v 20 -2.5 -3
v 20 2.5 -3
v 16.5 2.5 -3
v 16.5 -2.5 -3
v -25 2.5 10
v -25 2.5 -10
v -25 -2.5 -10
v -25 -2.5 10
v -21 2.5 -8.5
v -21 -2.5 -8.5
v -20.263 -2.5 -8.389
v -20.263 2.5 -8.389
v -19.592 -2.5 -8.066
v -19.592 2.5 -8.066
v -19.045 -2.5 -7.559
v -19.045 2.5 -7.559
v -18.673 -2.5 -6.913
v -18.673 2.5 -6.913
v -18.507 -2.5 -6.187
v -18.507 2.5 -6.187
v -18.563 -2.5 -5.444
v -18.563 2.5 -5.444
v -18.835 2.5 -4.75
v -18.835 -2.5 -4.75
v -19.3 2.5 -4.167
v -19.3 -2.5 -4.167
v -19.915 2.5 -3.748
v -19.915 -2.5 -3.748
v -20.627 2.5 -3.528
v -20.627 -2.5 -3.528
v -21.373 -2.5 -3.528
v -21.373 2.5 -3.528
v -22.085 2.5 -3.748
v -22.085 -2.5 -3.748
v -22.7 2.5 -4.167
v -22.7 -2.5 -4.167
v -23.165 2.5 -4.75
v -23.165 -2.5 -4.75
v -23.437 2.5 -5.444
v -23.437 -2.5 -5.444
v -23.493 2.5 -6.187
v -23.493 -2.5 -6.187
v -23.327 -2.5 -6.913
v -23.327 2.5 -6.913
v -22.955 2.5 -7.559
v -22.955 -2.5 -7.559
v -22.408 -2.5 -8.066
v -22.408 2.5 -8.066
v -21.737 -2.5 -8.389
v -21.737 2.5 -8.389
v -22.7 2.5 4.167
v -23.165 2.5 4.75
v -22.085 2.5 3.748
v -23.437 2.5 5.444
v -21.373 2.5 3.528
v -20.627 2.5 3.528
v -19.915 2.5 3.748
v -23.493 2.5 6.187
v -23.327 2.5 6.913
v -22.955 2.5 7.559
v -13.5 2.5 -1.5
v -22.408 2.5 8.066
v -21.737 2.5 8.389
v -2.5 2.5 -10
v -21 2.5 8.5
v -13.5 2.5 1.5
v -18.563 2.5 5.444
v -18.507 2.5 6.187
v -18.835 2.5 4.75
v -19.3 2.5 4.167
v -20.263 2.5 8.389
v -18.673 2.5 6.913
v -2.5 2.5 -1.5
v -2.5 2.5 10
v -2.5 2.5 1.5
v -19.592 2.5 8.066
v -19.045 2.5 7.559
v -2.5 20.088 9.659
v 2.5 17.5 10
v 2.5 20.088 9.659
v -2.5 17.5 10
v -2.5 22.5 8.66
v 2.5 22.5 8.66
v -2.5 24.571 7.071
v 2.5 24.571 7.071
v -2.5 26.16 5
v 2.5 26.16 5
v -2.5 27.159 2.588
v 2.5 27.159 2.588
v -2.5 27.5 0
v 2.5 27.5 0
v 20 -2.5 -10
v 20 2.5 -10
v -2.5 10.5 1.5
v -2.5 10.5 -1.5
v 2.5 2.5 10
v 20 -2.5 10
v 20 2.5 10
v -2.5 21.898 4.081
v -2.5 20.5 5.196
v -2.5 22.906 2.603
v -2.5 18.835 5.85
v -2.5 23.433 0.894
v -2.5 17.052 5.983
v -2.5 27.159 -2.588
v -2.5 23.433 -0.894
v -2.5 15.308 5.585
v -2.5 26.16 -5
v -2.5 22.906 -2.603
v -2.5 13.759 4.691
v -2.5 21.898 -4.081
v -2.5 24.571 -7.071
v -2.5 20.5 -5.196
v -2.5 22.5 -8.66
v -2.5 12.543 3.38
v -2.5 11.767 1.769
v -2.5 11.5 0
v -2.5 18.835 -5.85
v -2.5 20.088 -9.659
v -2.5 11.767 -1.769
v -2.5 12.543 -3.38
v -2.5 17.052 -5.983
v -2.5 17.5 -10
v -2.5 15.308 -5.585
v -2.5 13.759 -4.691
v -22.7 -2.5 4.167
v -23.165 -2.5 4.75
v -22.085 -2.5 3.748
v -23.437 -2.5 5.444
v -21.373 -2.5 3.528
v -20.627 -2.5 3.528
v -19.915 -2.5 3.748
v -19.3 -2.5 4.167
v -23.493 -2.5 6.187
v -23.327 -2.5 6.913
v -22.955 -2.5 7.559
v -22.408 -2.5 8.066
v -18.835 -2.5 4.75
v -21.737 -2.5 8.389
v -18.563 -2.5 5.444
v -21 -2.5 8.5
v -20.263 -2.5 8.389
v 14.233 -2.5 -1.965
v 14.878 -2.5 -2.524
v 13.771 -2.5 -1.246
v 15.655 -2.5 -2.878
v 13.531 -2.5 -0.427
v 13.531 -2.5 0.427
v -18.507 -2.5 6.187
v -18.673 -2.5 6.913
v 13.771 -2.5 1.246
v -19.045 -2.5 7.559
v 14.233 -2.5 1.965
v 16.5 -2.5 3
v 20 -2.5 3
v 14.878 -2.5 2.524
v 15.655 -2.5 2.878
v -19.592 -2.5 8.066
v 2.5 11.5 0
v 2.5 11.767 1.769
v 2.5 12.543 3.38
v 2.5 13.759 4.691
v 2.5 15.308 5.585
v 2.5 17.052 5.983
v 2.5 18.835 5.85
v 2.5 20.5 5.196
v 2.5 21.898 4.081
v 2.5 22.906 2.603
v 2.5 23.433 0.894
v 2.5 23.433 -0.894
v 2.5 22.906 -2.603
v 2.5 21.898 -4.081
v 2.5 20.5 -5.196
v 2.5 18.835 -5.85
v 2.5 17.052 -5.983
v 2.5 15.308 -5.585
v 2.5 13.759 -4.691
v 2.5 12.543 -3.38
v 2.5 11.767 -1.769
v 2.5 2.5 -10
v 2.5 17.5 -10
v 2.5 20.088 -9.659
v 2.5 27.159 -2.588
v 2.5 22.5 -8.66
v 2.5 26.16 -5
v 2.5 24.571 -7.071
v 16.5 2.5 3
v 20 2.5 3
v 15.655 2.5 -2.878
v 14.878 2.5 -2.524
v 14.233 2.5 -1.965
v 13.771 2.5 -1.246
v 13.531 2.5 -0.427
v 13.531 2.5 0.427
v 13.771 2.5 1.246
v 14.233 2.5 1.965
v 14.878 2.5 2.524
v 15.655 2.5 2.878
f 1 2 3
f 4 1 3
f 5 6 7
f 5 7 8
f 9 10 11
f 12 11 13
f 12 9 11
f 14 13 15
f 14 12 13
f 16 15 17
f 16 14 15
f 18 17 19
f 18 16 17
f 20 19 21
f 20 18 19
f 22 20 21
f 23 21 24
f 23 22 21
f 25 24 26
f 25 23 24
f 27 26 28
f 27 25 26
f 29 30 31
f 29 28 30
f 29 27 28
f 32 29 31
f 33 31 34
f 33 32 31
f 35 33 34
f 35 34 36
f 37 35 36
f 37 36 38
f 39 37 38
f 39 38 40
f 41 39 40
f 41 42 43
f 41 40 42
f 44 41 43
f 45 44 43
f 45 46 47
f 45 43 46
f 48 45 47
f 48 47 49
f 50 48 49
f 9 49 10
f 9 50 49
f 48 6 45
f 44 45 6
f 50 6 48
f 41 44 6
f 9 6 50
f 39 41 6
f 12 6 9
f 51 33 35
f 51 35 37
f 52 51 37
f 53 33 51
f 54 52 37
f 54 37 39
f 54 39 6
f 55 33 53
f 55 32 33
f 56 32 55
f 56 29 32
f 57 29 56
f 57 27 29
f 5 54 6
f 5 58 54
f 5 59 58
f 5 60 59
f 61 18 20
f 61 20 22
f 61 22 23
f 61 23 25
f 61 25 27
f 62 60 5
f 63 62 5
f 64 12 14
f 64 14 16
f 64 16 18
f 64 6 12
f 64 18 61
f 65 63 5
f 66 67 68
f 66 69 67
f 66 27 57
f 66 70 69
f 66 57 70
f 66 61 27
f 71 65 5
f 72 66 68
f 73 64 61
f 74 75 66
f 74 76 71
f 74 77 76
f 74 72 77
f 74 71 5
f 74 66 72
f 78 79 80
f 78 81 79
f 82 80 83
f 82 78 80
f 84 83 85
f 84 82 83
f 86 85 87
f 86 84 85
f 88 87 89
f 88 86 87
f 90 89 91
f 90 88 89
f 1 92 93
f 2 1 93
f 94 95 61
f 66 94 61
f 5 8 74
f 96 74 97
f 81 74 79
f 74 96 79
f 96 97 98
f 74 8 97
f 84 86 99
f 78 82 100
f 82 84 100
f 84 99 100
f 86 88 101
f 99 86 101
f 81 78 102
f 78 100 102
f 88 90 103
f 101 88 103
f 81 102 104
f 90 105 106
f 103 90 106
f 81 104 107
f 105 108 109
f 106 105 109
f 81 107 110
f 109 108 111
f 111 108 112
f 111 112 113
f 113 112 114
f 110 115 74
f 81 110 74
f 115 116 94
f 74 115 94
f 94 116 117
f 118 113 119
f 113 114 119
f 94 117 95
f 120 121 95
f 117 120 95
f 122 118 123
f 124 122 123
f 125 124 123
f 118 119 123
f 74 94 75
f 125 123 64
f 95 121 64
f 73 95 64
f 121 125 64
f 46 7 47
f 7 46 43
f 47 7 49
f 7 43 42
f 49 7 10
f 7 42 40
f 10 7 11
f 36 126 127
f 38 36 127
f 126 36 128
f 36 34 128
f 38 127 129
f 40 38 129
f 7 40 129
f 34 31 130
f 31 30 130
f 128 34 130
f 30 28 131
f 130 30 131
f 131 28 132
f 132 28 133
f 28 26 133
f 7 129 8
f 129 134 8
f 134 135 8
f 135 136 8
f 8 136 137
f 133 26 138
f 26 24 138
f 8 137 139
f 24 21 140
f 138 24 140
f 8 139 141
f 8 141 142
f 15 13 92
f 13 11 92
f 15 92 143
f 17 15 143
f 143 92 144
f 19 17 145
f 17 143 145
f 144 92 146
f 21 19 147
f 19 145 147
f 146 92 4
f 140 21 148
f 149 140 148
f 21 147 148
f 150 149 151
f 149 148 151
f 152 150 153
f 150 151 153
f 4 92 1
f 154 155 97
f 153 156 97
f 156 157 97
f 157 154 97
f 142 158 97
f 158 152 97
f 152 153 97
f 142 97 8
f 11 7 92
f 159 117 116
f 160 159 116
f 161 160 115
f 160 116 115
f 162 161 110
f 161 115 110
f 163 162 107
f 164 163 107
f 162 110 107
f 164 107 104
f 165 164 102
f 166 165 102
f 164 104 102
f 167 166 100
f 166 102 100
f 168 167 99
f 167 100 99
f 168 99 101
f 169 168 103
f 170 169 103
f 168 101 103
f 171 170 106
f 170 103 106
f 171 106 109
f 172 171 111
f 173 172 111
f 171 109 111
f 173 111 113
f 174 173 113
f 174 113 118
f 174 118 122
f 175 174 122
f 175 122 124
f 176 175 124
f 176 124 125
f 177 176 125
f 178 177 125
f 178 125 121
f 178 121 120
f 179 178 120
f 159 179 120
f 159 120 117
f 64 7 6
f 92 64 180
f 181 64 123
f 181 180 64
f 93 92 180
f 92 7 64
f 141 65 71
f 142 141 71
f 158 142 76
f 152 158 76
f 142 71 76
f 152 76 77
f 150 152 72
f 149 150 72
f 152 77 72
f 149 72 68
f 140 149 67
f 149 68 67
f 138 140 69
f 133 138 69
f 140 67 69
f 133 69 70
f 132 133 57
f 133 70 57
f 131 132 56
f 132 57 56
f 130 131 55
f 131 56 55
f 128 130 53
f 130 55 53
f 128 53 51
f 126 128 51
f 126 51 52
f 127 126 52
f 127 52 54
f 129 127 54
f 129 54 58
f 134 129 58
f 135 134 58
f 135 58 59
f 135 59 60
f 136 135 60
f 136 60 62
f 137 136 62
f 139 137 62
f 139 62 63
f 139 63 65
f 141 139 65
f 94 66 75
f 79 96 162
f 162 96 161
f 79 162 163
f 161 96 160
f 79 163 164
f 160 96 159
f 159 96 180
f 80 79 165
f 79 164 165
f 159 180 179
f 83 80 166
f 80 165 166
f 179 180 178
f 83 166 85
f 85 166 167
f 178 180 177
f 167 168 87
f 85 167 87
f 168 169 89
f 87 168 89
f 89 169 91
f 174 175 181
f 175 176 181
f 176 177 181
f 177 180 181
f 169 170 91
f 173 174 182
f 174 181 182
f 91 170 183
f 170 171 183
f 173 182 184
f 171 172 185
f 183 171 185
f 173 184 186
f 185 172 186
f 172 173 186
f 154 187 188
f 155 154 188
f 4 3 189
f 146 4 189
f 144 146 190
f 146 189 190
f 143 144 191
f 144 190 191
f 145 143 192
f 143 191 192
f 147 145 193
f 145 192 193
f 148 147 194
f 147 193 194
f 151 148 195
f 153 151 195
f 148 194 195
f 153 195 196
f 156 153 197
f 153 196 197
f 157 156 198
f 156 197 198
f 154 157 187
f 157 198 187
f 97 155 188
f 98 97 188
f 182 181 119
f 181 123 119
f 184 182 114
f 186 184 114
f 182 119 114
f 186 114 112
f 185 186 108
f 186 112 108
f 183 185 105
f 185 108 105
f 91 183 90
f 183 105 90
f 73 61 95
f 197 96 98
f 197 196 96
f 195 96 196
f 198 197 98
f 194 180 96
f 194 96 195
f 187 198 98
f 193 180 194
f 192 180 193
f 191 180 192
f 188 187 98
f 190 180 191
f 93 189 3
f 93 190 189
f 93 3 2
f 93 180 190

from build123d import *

# Parameters (mm, degrees)
EXTRUDE_1_DEPTH      = 10
EXTRUDE_1_DEPTH_BACK = 10
SKETCH_1_W           = 40
SKETCH_1_H           = 5
EXTRUDE_2_DEPTH      = 1.5
EXTRUDE_2_DEPTH_BACK = 1.5
FILLET_1_R           = 10
SKETCH_2_R           = 6
CUT_EXTRUDE_1_DEPTH  = 37.912057651
SKETCH_4_R           = 3
CUT_EXTRUDE_3_DEPTH  = 34.541019662
SKETCH_5_W           = 20
SKETCH_5_H           = 5
EXTRUDE_3_DEPTH      = 5
SKETCH_3_R           = 2.5
CUT_EXTRUDE_4_DEPTH  = 37.742346142


with BuildPart() as part:
    # Эскиз1 → Бобышка-Вытянуть1 (new, two sides: drawn at the far end of the back side and taken through both)
    with BuildSketch(Plane.XY.offset(-EXTRUDE_1_DEPTH_BACK)):
        Rectangle(SKETCH_1_W, SKETCH_1_H)
        Polygon((-2.5, 27.5), (-2.5, 10.5), (-2.5, 2.5), (2.5, 2.5), (2.5, 27.5), align=None)
    extrude(amount=EXTRUDE_1_DEPTH + EXTRUDE_1_DEPTH_BACK)

    # Эскиз1<3> → Бобышка-Вытянуть2 (add, two sides: drawn at the far end of the back side and taken through both)
    with BuildSketch(Plane.XY.offset(-EXTRUDE_2_DEPTH_BACK)):
        Polygon((-2.5, 10.5), (-13.5, 2.5), (-2.5, 2.5), align=None)
    extrude(amount=EXTRUDE_2_DEPTH + EXTRUDE_2_DEPTH_BACK)

    # Скругление1
    fillet_1_edges = [part.edges().sort_by_distance(p)[0] for p in [
        (0, 27.5, 10),
        (0, 27.5, -10),
    ]]
    fillet(fillet_1_edges, radius=FILLET_1_R - 0.0001)  # a hair under: the kernel refuses the full size

    # Эскиз2 → Вырез-Вытянуть1 (cut, through all)
    with BuildSketch(Plane.ZY.offset(2.5)):
        with Locations(Location((0, 17.5, 0), (0, 0, 270))):
            Circle(SKETCH_2_R)
    extrude(amount=-CUT_EXTRUDE_1_DEPTH, mode=Mode.SUBTRACT)

    # Эскиз4 → Вырез-Вытянуть3 (cut, through all)
    with BuildSketch(Plane(origin=(0, 2.5, 0), x_dir=(1, 0, 0), z_dir=(0, 1, 0))):
        with BuildLine():
            Line((20, 3), (16.5, 3))
            ThreePointArc((16.5, 3), (18.621320344, 2.121320344), (19.5, 0))
            ThreePointArc((19.5, 0), (18.621320344, -2.121320344), (16.5, -3))
            Line((16.5, -3), (20, -3))
            Line((20, -3), (20, 3))
        make_face()
        with Locations((16.5, 0)):
            Circle(SKETCH_4_R)
    extrude(amount=-CUT_EXTRUDE_3_DEPTH, mode=Mode.SUBTRACT)

    # Эскиз5 → Бобышка-Вытянуть3 (add)
    with BuildSketch(Plane.ZY.offset(20)):
        Rectangle(SKETCH_5_W, SKETCH_5_H)
    extrude(amount=EXTRUDE_3_DEPTH)

    # Эскиз3 → Вырез-Вытянуть4 (cut, through all)
    with BuildSketch(Plane(origin=(0, 2.5, 0), x_dir=(1, 0, 0), z_dir=(0, 1, 0))):
        with Locations(Location((-21, -6, 0), (0, 0, 270))):
            Circle(SKETCH_3_R)
    cut_extrude_4 = extrude(amount=-CUT_EXTRUDE_4_DEPTH, mode=Mode.SUBTRACT)

    # Зеркальное отражение1: Вырез-Вытянуть4 across plane
    add(cut_extrude_4.mirror(Plane.XY), mode=Mode.SUBTRACT)


solid = part.part
